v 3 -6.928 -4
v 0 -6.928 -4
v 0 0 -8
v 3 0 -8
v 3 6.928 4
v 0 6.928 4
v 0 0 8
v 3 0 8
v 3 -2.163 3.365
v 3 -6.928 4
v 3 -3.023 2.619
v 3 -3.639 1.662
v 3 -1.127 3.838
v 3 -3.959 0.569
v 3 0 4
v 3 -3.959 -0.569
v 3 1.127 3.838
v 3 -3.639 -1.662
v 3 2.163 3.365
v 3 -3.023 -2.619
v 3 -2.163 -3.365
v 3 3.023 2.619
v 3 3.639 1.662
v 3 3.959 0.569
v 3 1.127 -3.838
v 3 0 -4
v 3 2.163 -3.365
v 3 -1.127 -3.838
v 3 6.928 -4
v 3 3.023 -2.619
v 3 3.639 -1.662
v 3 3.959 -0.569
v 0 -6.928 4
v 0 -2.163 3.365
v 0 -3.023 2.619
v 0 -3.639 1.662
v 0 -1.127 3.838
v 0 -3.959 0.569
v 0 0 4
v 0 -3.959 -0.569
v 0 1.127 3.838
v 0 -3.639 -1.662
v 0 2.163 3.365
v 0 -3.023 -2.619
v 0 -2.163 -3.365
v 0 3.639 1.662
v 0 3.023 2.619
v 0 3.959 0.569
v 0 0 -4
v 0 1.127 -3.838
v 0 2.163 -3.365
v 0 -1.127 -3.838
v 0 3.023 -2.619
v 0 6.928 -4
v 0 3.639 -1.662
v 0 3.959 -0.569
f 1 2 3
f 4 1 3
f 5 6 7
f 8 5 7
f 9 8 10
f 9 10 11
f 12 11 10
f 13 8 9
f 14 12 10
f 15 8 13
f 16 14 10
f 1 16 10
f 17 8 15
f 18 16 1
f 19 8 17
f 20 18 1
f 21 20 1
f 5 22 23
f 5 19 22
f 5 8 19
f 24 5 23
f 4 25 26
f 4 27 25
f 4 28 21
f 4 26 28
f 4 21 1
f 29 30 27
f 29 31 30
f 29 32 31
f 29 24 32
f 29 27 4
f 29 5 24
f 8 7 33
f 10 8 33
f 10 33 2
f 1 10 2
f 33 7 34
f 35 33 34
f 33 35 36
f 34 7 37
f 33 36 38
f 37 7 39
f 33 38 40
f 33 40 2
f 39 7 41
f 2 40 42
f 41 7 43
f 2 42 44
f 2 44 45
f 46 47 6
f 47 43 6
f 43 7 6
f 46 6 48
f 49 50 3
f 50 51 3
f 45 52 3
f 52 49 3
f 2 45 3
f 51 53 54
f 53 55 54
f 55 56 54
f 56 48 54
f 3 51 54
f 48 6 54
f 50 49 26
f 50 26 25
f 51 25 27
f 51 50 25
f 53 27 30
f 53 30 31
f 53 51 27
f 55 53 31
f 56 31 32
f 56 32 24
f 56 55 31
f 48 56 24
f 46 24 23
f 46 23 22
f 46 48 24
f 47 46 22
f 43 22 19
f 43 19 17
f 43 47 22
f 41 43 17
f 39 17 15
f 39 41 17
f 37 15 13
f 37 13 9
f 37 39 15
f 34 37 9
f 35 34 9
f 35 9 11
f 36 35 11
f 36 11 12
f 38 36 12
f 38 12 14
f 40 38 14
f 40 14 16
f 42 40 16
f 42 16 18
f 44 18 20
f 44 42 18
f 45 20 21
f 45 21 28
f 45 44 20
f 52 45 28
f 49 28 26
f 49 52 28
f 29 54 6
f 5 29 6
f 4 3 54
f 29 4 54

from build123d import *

# Parameters (mm, degrees)
CROQUIS1_R              = 4
SALIENTE_EXTRUIR1_DEPTH = 3


with BuildPart() as part:
    # Croquis1 → Saliente-Extruir1 (new body)
    with BuildSketch(Plane(origin=(0, 0, 0), x_dir=(0, 0, -1), z_dir=(1, 0, 0))):
        Polygon((8, 0), (4, 6.92820323), (-4, 6.92820323), (-8, 0), (-4, -6.92820323), (4, -6.92820323), align=None)
        Circle(CROQUIS1_R, mode=Mode.SUBTRACT)
    extrude(amount=SALIENTE_EXTRUIR1_DEPTH)


solid = part.part
